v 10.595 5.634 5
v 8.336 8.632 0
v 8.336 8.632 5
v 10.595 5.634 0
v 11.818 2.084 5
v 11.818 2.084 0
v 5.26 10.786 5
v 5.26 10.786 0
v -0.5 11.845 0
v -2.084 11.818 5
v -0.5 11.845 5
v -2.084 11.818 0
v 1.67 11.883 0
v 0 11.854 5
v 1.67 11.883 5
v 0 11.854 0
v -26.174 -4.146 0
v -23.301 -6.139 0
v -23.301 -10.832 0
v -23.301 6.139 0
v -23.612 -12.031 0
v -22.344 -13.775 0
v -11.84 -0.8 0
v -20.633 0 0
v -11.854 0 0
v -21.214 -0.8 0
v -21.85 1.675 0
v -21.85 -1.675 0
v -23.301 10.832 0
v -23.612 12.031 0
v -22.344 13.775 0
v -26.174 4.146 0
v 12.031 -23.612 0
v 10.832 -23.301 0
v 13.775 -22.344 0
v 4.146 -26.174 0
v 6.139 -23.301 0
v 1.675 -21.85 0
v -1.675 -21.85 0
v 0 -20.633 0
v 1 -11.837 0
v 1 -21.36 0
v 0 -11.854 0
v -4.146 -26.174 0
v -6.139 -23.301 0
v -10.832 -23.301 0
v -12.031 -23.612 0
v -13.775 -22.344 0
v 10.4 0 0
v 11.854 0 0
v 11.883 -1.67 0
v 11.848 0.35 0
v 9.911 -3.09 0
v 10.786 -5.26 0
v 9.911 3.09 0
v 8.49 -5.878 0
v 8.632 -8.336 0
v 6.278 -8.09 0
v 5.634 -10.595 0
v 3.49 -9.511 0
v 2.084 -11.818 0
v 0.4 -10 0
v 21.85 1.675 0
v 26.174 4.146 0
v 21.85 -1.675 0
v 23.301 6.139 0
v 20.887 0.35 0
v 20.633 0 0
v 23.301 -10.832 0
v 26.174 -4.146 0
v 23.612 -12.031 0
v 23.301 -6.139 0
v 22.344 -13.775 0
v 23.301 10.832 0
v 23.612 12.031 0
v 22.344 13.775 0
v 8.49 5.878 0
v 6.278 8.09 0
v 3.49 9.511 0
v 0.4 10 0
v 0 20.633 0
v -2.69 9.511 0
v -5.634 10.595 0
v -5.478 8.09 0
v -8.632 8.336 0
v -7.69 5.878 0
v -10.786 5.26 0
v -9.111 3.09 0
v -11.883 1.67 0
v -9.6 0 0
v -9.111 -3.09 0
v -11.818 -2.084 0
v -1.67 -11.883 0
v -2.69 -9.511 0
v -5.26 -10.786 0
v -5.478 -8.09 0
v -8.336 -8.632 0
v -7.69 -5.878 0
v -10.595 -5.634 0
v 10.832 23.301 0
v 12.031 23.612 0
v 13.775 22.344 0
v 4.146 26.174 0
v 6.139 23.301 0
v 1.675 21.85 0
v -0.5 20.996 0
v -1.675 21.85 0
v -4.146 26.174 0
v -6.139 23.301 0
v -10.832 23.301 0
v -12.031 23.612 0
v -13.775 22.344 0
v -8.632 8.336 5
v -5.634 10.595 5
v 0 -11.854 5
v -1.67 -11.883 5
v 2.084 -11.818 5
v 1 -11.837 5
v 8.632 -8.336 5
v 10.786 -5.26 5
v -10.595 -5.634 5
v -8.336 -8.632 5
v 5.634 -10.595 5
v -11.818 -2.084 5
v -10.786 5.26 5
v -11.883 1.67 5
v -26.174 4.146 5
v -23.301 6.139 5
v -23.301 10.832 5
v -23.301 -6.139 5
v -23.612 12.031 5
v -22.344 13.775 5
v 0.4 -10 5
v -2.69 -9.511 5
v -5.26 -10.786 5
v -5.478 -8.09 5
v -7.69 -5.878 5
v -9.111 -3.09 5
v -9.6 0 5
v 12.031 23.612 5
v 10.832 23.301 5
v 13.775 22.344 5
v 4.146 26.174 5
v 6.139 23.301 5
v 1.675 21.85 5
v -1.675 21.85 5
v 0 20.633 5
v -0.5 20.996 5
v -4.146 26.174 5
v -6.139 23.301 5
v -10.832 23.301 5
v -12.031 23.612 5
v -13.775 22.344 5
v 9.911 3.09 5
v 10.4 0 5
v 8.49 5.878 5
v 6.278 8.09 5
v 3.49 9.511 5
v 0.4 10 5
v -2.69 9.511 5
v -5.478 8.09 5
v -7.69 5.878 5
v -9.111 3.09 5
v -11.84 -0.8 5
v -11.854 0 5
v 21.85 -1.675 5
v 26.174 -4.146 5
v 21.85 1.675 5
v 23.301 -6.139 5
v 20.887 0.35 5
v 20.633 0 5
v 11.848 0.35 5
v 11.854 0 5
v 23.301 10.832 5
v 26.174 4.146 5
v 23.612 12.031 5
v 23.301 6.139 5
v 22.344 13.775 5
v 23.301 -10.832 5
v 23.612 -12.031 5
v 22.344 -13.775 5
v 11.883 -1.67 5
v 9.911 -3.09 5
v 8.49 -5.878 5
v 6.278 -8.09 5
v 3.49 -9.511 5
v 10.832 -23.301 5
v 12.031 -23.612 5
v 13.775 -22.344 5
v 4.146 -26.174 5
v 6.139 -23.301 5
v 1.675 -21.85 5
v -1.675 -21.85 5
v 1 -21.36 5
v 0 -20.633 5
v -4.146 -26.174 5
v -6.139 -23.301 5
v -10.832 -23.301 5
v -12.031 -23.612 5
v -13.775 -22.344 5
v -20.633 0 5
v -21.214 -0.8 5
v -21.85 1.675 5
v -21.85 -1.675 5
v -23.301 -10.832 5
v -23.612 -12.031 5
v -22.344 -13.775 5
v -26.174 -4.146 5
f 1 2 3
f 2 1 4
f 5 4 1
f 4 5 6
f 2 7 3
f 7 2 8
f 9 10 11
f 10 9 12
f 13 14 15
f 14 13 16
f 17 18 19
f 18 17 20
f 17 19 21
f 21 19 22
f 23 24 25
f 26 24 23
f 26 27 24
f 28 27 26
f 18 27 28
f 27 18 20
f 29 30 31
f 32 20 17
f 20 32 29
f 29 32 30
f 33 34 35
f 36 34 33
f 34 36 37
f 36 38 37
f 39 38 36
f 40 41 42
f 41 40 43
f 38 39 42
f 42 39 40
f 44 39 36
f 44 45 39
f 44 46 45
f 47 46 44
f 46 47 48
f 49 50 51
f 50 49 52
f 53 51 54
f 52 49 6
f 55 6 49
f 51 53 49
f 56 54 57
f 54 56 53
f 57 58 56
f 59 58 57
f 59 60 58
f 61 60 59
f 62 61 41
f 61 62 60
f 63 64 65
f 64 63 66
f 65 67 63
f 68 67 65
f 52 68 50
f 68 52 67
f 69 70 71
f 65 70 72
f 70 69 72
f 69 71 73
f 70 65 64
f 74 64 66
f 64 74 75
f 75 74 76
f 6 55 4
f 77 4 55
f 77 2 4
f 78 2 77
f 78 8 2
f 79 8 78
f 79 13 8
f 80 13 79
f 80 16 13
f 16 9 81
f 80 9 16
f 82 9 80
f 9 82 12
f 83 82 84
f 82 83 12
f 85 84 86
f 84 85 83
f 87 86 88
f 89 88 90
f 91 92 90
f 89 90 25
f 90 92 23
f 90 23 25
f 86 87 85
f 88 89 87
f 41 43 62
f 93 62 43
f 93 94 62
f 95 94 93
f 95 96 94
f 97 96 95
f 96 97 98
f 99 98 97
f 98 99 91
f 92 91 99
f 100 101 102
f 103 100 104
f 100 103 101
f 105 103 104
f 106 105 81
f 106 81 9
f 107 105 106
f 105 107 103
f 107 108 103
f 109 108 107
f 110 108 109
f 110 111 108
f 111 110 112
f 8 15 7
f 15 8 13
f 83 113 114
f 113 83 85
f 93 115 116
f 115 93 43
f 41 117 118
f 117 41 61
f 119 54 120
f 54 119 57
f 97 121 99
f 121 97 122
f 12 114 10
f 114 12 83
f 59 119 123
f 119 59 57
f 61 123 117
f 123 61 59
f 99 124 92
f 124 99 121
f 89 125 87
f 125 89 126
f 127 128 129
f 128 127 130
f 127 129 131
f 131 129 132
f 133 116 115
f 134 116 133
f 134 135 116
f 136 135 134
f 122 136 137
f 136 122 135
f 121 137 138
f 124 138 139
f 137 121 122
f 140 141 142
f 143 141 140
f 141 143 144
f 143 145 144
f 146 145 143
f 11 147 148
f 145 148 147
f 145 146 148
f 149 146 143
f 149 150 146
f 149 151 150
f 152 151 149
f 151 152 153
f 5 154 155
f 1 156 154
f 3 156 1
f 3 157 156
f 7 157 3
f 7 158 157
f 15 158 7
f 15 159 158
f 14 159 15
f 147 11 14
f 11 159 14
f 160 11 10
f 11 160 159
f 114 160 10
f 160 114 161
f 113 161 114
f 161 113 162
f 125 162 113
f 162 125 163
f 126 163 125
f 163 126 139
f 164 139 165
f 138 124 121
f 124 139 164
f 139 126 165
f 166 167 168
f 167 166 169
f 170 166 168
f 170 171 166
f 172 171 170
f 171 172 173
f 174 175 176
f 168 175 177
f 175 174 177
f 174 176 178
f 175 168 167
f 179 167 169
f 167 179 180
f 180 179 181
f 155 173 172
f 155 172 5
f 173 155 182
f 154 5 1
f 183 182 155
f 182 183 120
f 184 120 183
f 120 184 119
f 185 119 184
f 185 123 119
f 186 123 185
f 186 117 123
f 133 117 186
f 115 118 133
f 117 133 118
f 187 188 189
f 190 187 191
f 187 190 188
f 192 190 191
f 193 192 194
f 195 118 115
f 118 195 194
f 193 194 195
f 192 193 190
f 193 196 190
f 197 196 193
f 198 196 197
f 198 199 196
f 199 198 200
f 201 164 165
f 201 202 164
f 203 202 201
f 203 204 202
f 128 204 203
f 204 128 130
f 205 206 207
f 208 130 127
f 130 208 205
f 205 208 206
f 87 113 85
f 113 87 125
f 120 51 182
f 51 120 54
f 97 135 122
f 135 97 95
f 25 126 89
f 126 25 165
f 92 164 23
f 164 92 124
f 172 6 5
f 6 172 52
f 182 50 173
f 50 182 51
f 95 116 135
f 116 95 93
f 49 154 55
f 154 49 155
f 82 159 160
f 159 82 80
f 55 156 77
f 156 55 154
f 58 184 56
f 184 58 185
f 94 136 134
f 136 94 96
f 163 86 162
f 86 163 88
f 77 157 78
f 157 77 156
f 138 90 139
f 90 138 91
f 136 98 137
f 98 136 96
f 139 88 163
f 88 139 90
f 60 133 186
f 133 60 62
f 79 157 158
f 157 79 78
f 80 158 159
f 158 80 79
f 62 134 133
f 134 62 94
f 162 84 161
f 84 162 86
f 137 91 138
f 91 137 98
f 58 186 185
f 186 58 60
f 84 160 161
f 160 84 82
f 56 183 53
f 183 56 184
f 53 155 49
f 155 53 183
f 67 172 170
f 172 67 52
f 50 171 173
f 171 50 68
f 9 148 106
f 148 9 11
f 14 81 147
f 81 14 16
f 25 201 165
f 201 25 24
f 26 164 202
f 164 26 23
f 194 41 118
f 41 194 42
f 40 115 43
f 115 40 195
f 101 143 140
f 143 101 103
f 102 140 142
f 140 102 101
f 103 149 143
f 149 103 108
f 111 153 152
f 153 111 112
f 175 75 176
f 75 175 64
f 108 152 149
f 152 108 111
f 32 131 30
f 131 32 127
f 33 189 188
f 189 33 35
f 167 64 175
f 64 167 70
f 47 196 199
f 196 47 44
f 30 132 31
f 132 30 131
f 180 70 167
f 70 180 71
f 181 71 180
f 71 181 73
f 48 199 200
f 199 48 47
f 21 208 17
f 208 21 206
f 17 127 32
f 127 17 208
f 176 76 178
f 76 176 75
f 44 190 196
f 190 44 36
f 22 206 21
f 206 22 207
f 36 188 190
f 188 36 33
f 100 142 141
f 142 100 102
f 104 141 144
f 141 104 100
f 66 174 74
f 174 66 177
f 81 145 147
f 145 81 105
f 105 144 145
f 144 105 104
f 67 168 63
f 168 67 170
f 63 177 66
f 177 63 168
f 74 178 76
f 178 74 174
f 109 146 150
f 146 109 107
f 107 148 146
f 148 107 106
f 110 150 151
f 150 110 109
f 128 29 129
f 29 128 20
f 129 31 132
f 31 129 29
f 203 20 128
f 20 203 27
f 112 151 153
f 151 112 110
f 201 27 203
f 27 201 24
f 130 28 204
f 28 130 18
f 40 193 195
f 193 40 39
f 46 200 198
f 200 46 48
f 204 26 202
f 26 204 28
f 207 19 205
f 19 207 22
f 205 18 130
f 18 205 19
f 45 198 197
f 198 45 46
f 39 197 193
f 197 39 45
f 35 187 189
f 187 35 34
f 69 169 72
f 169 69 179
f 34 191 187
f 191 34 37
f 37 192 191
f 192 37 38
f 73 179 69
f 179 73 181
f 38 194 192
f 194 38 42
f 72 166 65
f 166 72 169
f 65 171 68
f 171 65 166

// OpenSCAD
// 5@xes Thin Part Test for Cura 5.0 test 2022 Rought
// Thichness 
//   - 0.35
//   - 0.5
//   - 0.8
//   - 1

$fn=20;

union () {
    translate([11,0,0]) cube([15,0.35,5], center = false);
    translate([0,11,0]) rotate(90, [0,0,1]) cube([15,0.5,5], center = false);
    translate([-11,0,0]) rotate(180, [0,0,1]) cube([15,0.8,5], center = false);
    translate([0,-11,0]) rotate(-90, [0,0,1]) cube([15,1,5], center = false);
    difference() {
        rotate([0,0,10]) cylinder(r=12, h=5);
        translate([0.4,0,-1]) cylinder(r=10, h=10);
    }
}

union () {
    rotate([0,0,45]) difference() {
        cylinder(r=26.5, h=5);
        translate([12,0,-1]) cylinder(r=15, h=10);
        translate([0,12,-1]) cylinder(r=15, h=10);
        translate([-12,0,-1]) cylinder(r=15, h=10);
        translate([0,-12,-1]) cylinder(r=15, h=10);
    }
}
